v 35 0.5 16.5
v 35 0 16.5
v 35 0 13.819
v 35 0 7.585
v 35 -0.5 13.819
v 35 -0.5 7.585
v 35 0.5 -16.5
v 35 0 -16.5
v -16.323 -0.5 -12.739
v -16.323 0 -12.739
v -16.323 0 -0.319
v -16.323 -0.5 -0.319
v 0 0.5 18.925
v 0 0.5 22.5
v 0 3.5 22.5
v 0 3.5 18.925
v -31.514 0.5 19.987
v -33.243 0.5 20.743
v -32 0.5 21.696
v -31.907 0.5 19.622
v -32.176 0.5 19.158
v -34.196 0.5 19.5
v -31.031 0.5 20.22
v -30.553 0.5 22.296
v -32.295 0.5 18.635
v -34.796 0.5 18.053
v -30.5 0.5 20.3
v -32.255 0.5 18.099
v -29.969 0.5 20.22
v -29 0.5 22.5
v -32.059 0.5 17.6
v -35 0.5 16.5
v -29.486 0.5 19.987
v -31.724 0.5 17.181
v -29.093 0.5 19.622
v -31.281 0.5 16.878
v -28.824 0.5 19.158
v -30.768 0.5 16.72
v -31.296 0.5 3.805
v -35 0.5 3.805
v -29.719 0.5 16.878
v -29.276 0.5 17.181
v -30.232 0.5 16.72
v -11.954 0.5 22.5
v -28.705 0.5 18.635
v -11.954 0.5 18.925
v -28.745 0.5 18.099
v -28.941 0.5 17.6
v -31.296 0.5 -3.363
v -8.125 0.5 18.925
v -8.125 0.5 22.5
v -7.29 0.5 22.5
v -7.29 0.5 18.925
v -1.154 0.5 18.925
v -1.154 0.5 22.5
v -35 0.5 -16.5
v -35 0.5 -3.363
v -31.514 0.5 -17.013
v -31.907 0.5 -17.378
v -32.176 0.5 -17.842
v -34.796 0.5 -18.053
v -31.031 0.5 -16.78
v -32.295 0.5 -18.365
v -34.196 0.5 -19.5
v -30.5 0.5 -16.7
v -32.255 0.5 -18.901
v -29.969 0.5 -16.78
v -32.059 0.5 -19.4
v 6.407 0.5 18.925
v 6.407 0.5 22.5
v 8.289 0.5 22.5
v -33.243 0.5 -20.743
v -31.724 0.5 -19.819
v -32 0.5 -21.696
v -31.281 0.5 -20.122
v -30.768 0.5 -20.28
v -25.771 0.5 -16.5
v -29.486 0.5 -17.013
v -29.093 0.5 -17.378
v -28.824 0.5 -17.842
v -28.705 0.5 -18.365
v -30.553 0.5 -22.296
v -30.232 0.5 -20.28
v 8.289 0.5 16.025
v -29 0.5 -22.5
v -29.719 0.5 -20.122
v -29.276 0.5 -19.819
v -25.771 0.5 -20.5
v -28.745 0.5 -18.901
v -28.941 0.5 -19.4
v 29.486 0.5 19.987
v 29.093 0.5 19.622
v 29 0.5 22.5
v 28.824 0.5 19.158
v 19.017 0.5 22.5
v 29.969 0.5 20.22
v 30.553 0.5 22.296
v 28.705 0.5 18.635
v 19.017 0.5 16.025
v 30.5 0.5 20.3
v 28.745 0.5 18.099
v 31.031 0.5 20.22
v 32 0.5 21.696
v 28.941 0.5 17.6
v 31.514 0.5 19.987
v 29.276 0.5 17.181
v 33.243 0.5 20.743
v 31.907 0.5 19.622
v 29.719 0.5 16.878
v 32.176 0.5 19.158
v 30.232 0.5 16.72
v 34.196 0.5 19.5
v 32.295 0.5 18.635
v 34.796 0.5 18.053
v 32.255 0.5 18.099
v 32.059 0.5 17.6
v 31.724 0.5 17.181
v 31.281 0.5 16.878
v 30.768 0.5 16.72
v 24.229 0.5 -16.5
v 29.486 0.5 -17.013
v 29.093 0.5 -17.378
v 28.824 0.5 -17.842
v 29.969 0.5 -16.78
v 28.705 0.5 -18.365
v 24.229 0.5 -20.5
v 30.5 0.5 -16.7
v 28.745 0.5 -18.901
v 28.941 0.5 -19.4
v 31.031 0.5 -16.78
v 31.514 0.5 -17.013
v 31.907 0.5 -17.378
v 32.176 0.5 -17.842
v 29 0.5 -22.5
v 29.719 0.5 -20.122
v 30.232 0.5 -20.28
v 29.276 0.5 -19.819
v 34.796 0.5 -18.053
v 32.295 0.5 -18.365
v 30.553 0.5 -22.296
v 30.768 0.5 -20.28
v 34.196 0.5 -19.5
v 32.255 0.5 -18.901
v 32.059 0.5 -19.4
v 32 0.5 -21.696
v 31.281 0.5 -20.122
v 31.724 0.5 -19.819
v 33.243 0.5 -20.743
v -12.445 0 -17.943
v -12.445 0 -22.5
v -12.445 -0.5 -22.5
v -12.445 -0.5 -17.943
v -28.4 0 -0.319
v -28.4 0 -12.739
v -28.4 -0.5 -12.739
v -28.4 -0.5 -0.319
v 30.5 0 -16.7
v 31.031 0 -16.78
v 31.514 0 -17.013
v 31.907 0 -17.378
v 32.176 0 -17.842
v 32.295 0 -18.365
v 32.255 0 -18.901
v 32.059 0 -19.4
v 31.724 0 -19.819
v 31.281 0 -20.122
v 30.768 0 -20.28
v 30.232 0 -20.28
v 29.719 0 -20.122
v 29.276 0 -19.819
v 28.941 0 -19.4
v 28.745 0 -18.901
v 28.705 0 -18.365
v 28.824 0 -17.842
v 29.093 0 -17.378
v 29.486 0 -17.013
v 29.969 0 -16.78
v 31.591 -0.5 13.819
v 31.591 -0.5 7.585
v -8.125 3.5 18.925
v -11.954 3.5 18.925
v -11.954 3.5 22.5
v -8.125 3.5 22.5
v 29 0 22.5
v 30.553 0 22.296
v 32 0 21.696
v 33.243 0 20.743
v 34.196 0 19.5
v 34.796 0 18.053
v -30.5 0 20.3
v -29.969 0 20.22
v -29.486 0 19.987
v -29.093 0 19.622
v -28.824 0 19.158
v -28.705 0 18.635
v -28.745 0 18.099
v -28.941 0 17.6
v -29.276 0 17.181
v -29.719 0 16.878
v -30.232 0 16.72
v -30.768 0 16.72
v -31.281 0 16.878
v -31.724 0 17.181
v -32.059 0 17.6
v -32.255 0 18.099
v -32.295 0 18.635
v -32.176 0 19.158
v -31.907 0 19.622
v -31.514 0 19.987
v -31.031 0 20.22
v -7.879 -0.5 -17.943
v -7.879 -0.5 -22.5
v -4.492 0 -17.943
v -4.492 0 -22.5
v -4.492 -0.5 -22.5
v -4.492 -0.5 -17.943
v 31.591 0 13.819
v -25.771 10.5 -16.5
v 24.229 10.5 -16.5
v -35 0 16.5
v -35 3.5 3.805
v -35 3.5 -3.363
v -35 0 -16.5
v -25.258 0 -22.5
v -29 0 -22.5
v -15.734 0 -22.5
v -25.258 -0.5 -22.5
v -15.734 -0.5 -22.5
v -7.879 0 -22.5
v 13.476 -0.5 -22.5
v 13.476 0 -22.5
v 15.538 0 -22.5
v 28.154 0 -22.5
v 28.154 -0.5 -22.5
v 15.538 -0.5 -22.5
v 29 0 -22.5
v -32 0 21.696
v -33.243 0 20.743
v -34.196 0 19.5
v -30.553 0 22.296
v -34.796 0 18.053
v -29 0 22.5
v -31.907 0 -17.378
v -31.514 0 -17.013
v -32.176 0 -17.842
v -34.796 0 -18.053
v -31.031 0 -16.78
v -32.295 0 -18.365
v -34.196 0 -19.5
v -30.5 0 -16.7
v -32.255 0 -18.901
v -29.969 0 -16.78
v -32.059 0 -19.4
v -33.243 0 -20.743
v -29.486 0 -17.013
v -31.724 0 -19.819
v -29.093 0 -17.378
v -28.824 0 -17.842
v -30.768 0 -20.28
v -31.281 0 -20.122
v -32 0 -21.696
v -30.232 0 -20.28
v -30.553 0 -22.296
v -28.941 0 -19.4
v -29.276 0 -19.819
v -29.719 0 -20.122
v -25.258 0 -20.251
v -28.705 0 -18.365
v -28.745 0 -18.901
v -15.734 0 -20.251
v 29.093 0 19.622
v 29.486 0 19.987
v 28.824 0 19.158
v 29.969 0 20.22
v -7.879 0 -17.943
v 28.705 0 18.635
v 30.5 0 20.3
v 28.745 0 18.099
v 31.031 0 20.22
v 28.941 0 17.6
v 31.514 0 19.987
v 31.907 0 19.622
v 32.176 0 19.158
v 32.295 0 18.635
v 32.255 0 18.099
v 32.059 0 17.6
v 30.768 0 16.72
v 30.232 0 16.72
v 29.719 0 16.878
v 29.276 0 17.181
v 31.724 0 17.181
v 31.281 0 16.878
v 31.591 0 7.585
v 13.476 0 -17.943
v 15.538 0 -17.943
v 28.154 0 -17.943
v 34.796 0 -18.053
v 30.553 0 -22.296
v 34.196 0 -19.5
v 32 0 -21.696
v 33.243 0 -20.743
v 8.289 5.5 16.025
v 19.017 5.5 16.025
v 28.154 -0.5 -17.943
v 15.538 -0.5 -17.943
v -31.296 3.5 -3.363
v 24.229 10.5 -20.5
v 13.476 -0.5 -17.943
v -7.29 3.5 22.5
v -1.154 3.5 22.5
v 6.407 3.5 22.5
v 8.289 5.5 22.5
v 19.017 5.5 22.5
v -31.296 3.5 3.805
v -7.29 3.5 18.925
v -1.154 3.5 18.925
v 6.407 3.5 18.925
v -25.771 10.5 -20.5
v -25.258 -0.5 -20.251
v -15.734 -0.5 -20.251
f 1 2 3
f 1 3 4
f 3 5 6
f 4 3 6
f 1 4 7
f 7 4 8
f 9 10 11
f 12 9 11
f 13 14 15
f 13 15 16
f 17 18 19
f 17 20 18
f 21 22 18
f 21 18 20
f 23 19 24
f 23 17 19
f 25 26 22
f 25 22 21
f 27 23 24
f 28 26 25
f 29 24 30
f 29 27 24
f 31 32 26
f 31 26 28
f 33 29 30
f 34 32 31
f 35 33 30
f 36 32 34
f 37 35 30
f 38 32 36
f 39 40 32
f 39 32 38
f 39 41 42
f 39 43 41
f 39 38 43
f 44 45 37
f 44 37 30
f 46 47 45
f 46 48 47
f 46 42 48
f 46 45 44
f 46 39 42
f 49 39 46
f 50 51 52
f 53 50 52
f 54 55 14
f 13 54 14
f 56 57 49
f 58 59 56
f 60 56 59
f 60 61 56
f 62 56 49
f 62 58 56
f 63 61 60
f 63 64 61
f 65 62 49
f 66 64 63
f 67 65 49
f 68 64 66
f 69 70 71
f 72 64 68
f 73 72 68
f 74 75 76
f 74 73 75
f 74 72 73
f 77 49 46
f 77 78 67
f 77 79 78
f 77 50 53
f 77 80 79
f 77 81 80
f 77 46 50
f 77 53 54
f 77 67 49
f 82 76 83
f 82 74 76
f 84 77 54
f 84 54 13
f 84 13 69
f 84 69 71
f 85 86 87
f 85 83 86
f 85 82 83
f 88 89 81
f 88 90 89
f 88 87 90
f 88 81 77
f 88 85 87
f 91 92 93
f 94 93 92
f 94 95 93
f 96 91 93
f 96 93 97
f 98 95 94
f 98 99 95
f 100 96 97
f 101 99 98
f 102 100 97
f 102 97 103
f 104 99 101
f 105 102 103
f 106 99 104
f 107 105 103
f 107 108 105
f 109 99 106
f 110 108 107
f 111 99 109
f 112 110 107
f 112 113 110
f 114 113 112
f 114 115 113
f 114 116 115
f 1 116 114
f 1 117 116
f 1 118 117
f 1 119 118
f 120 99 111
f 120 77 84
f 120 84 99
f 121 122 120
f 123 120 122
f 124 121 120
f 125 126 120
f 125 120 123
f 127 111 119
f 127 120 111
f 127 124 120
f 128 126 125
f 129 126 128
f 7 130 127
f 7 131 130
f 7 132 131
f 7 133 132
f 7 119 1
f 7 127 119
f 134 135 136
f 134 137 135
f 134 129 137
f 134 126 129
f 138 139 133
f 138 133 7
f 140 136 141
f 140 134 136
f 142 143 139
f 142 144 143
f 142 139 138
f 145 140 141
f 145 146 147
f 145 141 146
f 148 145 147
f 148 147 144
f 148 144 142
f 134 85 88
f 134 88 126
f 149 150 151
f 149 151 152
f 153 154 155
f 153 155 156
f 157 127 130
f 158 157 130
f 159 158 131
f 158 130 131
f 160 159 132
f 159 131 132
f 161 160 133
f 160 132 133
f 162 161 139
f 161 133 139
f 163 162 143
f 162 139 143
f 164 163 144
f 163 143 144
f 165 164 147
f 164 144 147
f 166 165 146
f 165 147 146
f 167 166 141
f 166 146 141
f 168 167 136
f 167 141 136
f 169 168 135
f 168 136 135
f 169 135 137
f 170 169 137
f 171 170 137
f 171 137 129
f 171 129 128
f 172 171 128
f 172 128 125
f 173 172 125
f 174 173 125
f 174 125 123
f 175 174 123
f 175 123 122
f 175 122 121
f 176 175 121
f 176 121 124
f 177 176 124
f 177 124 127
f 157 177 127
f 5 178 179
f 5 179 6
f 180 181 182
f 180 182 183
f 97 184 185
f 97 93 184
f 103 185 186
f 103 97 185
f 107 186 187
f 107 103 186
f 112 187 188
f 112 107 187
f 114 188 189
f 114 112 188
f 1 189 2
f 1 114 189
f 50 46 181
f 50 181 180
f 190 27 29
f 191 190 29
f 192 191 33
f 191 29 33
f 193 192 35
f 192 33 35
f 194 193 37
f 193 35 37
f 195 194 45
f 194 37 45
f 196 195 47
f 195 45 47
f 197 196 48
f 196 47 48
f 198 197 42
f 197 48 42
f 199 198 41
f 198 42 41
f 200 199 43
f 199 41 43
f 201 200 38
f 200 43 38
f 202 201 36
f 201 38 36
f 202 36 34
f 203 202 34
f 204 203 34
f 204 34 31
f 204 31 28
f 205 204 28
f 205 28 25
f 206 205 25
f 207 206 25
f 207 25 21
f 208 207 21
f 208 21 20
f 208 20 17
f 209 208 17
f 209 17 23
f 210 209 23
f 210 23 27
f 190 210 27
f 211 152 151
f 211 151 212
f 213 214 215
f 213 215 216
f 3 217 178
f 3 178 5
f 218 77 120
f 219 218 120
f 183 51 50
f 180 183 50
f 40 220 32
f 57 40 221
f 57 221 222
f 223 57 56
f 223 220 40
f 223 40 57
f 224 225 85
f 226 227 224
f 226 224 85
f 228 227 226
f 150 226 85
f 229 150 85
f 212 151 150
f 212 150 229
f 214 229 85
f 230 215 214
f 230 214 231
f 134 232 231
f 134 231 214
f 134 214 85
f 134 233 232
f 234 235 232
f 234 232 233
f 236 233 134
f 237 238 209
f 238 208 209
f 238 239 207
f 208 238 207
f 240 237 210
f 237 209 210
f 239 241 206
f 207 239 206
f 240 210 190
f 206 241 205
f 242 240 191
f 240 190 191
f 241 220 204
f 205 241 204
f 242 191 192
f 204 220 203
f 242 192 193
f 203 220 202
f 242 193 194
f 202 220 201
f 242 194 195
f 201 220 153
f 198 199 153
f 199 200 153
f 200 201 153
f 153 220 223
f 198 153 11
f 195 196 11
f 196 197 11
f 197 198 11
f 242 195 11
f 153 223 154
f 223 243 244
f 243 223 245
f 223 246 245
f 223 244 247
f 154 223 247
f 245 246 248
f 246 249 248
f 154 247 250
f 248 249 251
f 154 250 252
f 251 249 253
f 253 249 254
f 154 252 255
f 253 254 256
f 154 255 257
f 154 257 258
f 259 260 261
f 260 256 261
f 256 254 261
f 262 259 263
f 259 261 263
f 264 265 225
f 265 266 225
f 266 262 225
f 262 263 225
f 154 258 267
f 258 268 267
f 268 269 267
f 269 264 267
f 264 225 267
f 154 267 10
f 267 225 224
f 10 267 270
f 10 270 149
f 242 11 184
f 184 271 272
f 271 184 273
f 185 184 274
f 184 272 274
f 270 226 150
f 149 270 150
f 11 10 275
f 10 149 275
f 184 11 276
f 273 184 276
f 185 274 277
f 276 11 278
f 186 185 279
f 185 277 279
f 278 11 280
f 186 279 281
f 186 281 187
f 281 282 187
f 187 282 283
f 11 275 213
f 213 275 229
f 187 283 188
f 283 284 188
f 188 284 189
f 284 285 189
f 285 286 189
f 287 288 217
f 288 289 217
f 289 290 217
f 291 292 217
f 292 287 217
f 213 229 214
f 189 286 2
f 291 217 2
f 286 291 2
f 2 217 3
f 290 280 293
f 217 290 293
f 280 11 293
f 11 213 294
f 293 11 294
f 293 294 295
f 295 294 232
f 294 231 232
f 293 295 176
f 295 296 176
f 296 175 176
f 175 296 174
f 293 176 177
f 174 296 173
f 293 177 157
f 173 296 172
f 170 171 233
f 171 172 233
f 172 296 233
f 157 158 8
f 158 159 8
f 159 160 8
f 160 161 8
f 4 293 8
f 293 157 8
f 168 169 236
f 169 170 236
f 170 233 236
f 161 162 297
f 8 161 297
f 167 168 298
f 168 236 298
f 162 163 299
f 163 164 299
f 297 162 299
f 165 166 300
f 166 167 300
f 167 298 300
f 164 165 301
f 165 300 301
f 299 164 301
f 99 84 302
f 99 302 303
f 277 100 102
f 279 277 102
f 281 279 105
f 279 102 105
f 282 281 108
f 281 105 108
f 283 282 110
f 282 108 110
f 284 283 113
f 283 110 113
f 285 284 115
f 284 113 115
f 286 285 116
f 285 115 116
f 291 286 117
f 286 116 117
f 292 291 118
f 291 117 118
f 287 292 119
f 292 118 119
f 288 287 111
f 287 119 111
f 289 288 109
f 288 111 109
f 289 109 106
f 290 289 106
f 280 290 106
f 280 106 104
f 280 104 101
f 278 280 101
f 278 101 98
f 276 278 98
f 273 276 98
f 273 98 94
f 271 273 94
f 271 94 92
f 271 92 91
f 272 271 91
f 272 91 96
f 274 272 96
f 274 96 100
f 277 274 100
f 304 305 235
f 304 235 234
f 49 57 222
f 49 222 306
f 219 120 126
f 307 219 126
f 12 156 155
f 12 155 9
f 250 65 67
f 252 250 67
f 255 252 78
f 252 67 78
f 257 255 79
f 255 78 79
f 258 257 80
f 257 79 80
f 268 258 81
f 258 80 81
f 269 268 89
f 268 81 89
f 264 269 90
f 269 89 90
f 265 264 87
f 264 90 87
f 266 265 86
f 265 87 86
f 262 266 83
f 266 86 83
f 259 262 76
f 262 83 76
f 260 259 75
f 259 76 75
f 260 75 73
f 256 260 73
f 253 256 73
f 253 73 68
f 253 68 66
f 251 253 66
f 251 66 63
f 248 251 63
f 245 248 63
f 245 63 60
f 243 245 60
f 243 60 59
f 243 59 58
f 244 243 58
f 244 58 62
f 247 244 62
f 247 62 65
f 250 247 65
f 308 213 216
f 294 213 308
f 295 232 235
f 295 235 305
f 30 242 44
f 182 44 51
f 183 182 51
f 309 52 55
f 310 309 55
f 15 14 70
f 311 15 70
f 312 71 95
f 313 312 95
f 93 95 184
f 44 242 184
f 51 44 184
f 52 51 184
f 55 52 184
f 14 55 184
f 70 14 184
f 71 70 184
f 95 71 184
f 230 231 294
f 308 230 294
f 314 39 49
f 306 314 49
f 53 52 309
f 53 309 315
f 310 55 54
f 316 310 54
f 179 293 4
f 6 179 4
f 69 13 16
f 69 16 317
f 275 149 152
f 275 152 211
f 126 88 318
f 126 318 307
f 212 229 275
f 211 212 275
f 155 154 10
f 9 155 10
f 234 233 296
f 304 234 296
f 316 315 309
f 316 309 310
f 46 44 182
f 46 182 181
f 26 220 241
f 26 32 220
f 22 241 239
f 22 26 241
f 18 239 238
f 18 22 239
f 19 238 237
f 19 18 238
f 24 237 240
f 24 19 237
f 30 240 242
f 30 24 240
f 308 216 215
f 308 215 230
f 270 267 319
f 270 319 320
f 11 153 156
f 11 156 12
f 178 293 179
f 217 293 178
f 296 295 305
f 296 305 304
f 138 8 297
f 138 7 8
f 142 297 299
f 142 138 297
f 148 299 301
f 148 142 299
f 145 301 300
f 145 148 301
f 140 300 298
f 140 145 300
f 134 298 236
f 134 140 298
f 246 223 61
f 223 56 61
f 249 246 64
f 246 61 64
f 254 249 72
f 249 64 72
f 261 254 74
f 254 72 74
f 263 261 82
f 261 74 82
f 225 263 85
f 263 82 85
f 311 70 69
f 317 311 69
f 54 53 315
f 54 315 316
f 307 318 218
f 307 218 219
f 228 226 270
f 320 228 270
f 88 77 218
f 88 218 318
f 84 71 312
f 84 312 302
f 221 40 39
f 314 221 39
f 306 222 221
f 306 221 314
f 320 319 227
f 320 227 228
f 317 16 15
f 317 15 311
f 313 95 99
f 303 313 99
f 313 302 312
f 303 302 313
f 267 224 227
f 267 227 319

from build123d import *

# Parameters (mm, degrees)
SKETCH_1_W          = 70
SKETCH_1_H          = 45
EXTRUDE_1_DEPTH     = 0.5
FILLET_1_R          = 6
SKETCH_3_R          = 1.8
CUT_EXTRUDE_1_DEPTH = 1
SKETCH_4_W          = 50
SKETCH_4_H          = 4
EXTRUDE_2_DEPTH     = 10
SKETCH_5_W          = 9.523878632
SKETCH_5_H          = 2.249484867
SKETCH_5_W_2        = 4.565570684
SKETCH_5_H_2        = 4.556816288
SKETCH_5_W_3        = 17.967729791
SKETCH_5_W_4        = 12.616684579
SKETCH_5_W_5        = 12.076670843
SKETCH_5_H_3        = 12.420315948
SKETCH_5_W_6        = 3.409196393
SKETCH_5_H_4        = 6.234704053
EXTRUDE_3_DEPTH     = 0.5
SKETCH_6_W          = 10.728619563
SKETCH_6_H          = 6.475095536
EXTRUDE_4_DEPTH     = 5
SKETCH_7_W          = 6.406526606
SKETCH_7_H          = 3.574973131
SKETCH_7_W_2        = 6.136519737
SKETCH_7_W_3        = 3.829188316
SKETCH_7_W_4        = 3.70374934
SKETCH_7_H_2        = 7.167455053
EXTRUDE_5_DEPTH     = 3


with BuildPart() as part:
    # 草图1 → 凸台-拉伸1 (new body)
    with BuildSketch(Plane(origin=(0, 0, 0), x_dir=(1, 0, 0), z_dir=(0, 1, 0))):
        Rectangle(SKETCH_1_W, SKETCH_1_H)
    extrude(amount=EXTRUDE_1_DEPTH)

    # 圆角1
    fillet_1_edges = [part.edges().sort_by_distance(p)[0] for p in [
        (-35, 0.25, -22.5),
        (35, 0.25, -22.5),
        (35, 0.25, 22.5),
        (-35, 0.25, 22.5),
    ]]
    fillet(fillet_1_edges, radius=FILLET_1_R)

    # 草图3 → 切除-拉伸1 (cut)
    with BuildSketch(Plane(origin=(0, 0.5, 0), x_dir=(1, 0, 0), z_dir=(0, 1, 0))):
        with Locations(Location((30.5, 18.5, 0), (0, 0, 270))):
            Circle(SKETCH_3_R)
        with Locations(Location((30.5, -18.5, 0), (0, 0, 270))):
            Circle(SKETCH_3_R)
        with Locations(Location((-30.5, -18.5, 0), (0, 0, 270))):
            Circle(SKETCH_3_R)
        with Locations(Location((-30.5, 18.5, 0), (0, 0, 270))):
            Circle(SKETCH_3_R)
    extrude(amount=-CUT_EXTRUDE_1_DEPTH, mode=Mode.SUBTRACT)

    # 草图4 → 凸台-拉伸2 (add)
    with BuildSketch(Plane(origin=(0, 0.5, 0), x_dir=(1, 0, 0), z_dir=(0, 1, 0))):
        with Locations((-0.770536001, 18.5)):
            Rectangle(SKETCH_4_W, SKETCH_4_H)
    extrude(amount=EXTRUDE_2_DEPTH)

    # 草图5 → 凸台-拉伸3 (add)
    with BuildSketch(Plane.XZ):
        with Locations((-20.495975922, -21.375257567)):
            Rectangle(SKETCH_5_W, SKETCH_5_H)
        with Locations((-10.162076685, -20.221591856)):
            Rectangle(SKETCH_5_W_2, SKETCH_5_H_2)
        with Locations((4.491932447, -20.221591856)):
            Rectangle(SKETCH_5_W_3, SKETCH_5_H_2)
        with Locations((21.846010265, -20.221591856)):
            Rectangle(SKETCH_5_W_4, SKETCH_5_H_2)
        with Locations((-22.361477923, -6.529257)):
            Rectangle(SKETCH_5_W_5, SKETCH_5_H_3)
        with Locations((33.295401803, 10.702090421)):
            Rectangle(SKETCH_5_W_6, SKETCH_5_H_4)
    extrude(amount=EXTRUDE_3_DEPTH)

    # 草图6 → 凸台-拉伸4 (add)
    with BuildSketch(Plane(origin=(0, 0.5, 0), x_dir=(1, 0, 0), z_dir=(0, 1, 0))):
        with Locations((13.653186787, -19.262452232)):
            Rectangle(SKETCH_6_W, SKETCH_6_H)
    extrude(amount=EXTRUDE_4_DEPTH)

    # 草图7 → 凸台-拉伸5 (add)
    with BuildSketch(Plane(origin=(0, 0.5, 0), x_dir=(1, 0, 0), z_dir=(0, 1, 0))):
        with Locations((3.203263303, -20.712513434)):
            Rectangle(SKETCH_7_W, SKETCH_7_H)
        with Locations((-4.22192558, -20.712513434)):
            Rectangle(SKETCH_7_W_2, SKETCH_7_H)
        with Locations((-10.03934629, -20.712513434)):
            Rectangle(SKETCH_7_W_3, SKETCH_7_H)
        with Locations((-33.14812533, -0.22091471)):
            Rectangle(SKETCH_7_W_4, SKETCH_7_H_2)
    extrude(amount=EXTRUDE_5_DEPTH)


solid = part.part
